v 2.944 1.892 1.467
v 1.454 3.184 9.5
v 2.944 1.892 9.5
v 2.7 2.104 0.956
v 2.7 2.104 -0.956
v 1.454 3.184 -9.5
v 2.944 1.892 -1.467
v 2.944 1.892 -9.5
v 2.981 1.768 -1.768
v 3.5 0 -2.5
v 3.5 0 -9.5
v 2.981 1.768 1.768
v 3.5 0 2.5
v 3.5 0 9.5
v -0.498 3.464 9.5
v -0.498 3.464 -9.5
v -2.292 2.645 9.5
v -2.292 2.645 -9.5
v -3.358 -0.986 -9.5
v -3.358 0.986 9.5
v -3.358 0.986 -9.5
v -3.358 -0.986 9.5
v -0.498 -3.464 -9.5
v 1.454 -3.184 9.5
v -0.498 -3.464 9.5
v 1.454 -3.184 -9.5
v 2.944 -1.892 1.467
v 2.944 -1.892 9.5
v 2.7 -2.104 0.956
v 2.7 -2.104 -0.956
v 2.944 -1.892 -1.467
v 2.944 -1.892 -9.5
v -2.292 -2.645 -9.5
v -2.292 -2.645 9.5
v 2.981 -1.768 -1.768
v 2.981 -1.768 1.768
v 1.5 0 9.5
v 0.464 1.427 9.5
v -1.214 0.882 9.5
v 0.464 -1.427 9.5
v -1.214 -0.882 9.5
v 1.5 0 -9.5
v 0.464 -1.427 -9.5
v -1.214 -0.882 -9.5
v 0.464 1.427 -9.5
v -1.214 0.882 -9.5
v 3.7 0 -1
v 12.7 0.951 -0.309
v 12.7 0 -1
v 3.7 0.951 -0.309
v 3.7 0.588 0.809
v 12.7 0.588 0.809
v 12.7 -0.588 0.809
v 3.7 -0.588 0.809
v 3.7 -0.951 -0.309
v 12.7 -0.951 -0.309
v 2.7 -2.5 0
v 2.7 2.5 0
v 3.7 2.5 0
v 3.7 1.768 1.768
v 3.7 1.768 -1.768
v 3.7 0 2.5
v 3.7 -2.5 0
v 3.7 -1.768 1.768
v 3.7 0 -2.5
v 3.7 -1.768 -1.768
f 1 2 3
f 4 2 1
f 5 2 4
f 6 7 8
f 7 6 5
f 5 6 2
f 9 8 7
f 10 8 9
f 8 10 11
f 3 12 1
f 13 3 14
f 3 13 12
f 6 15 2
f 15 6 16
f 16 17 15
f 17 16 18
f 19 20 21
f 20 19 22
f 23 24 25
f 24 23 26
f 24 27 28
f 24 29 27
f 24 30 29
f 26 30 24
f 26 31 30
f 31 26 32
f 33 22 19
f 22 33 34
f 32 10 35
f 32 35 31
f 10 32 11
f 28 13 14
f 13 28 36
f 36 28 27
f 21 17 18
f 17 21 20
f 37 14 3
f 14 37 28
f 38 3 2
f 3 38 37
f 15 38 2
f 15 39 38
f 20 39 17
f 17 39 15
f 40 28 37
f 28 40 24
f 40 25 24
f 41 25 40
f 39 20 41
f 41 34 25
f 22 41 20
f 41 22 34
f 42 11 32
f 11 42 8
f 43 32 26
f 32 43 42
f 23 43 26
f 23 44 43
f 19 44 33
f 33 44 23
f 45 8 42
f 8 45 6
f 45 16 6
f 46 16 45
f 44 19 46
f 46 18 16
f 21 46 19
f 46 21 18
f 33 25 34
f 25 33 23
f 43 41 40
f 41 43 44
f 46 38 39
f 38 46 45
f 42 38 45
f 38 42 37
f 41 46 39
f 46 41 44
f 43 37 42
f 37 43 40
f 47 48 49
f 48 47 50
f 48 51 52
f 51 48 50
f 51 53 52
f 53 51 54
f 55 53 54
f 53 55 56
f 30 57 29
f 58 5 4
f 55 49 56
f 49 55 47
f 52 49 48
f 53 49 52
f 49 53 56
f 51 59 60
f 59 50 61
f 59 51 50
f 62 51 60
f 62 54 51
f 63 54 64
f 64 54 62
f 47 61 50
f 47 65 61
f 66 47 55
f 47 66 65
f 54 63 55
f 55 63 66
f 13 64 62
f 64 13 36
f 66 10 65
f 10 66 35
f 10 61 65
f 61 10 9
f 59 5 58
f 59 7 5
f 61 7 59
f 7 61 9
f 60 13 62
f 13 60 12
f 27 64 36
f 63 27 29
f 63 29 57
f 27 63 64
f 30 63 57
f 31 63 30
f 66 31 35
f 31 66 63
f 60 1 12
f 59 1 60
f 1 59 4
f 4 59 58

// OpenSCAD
// Parameters
bore_diameter_mm = 3; //[1.5:6:0.1]
outer_diameter_mm = 7; //[3.5:14:0.1]
length_mm = 19; //[9.5:38:0.1]
bore_radius_mm = 1.5; //[0.75:3:0.05]
outer_radius_mm = 3.5; //[1.75:7:0.05]
wall_thickness_mm = 2; //[1:4:0.1]
eps_mm = 0.8; //[0.2:2:0.1]
screw_shank_radius_mm = 1; //[0.5:2:0.1]
screw_length_mm = 10; //[5:20:0.5]
washer_radius_mm = 2.5; //[1.5:5:0.1]
washer_thickness_mm = 1; //[0.5:2:0.1]

// Linear Bearing - complete geometry
module linear_bearing() {
  color([0.85, 0.85, 0.8]) {
    difference() {
      // Outer cylinder
      cylinder(h=length_mm, r=outer_radius_mm, center=true);
      // Through bore
      cylinder(h=length_mm + 2*eps_mm, r=bore_radius_mm, center=true);
    }
  }
}

// Screw and Washer - complete geometry
module screw_and_washer() {
  color("DimGray") {
    union() {
      // Screw shank
      translate([outer_radius_mm + screw_length_mm/2 - eps_mm, 0, 0])
        rotate([0, 90, 0])
        cylinder(h=screw_length_mm, r=screw_shank_radius_mm, center=true);
      // Washer
      translate([outer_radius_mm + washer_thickness_mm/2 - eps_mm, 0, 0])
        rotate([0, 90, 0])
        cylinder(h=washer_thickness_mm, r=washer_radius_mm, center=true);
    }
  }
}

// Assembly
module assembly() {
  linear_bearing();
  screw_and_washer();
}

assembly();
